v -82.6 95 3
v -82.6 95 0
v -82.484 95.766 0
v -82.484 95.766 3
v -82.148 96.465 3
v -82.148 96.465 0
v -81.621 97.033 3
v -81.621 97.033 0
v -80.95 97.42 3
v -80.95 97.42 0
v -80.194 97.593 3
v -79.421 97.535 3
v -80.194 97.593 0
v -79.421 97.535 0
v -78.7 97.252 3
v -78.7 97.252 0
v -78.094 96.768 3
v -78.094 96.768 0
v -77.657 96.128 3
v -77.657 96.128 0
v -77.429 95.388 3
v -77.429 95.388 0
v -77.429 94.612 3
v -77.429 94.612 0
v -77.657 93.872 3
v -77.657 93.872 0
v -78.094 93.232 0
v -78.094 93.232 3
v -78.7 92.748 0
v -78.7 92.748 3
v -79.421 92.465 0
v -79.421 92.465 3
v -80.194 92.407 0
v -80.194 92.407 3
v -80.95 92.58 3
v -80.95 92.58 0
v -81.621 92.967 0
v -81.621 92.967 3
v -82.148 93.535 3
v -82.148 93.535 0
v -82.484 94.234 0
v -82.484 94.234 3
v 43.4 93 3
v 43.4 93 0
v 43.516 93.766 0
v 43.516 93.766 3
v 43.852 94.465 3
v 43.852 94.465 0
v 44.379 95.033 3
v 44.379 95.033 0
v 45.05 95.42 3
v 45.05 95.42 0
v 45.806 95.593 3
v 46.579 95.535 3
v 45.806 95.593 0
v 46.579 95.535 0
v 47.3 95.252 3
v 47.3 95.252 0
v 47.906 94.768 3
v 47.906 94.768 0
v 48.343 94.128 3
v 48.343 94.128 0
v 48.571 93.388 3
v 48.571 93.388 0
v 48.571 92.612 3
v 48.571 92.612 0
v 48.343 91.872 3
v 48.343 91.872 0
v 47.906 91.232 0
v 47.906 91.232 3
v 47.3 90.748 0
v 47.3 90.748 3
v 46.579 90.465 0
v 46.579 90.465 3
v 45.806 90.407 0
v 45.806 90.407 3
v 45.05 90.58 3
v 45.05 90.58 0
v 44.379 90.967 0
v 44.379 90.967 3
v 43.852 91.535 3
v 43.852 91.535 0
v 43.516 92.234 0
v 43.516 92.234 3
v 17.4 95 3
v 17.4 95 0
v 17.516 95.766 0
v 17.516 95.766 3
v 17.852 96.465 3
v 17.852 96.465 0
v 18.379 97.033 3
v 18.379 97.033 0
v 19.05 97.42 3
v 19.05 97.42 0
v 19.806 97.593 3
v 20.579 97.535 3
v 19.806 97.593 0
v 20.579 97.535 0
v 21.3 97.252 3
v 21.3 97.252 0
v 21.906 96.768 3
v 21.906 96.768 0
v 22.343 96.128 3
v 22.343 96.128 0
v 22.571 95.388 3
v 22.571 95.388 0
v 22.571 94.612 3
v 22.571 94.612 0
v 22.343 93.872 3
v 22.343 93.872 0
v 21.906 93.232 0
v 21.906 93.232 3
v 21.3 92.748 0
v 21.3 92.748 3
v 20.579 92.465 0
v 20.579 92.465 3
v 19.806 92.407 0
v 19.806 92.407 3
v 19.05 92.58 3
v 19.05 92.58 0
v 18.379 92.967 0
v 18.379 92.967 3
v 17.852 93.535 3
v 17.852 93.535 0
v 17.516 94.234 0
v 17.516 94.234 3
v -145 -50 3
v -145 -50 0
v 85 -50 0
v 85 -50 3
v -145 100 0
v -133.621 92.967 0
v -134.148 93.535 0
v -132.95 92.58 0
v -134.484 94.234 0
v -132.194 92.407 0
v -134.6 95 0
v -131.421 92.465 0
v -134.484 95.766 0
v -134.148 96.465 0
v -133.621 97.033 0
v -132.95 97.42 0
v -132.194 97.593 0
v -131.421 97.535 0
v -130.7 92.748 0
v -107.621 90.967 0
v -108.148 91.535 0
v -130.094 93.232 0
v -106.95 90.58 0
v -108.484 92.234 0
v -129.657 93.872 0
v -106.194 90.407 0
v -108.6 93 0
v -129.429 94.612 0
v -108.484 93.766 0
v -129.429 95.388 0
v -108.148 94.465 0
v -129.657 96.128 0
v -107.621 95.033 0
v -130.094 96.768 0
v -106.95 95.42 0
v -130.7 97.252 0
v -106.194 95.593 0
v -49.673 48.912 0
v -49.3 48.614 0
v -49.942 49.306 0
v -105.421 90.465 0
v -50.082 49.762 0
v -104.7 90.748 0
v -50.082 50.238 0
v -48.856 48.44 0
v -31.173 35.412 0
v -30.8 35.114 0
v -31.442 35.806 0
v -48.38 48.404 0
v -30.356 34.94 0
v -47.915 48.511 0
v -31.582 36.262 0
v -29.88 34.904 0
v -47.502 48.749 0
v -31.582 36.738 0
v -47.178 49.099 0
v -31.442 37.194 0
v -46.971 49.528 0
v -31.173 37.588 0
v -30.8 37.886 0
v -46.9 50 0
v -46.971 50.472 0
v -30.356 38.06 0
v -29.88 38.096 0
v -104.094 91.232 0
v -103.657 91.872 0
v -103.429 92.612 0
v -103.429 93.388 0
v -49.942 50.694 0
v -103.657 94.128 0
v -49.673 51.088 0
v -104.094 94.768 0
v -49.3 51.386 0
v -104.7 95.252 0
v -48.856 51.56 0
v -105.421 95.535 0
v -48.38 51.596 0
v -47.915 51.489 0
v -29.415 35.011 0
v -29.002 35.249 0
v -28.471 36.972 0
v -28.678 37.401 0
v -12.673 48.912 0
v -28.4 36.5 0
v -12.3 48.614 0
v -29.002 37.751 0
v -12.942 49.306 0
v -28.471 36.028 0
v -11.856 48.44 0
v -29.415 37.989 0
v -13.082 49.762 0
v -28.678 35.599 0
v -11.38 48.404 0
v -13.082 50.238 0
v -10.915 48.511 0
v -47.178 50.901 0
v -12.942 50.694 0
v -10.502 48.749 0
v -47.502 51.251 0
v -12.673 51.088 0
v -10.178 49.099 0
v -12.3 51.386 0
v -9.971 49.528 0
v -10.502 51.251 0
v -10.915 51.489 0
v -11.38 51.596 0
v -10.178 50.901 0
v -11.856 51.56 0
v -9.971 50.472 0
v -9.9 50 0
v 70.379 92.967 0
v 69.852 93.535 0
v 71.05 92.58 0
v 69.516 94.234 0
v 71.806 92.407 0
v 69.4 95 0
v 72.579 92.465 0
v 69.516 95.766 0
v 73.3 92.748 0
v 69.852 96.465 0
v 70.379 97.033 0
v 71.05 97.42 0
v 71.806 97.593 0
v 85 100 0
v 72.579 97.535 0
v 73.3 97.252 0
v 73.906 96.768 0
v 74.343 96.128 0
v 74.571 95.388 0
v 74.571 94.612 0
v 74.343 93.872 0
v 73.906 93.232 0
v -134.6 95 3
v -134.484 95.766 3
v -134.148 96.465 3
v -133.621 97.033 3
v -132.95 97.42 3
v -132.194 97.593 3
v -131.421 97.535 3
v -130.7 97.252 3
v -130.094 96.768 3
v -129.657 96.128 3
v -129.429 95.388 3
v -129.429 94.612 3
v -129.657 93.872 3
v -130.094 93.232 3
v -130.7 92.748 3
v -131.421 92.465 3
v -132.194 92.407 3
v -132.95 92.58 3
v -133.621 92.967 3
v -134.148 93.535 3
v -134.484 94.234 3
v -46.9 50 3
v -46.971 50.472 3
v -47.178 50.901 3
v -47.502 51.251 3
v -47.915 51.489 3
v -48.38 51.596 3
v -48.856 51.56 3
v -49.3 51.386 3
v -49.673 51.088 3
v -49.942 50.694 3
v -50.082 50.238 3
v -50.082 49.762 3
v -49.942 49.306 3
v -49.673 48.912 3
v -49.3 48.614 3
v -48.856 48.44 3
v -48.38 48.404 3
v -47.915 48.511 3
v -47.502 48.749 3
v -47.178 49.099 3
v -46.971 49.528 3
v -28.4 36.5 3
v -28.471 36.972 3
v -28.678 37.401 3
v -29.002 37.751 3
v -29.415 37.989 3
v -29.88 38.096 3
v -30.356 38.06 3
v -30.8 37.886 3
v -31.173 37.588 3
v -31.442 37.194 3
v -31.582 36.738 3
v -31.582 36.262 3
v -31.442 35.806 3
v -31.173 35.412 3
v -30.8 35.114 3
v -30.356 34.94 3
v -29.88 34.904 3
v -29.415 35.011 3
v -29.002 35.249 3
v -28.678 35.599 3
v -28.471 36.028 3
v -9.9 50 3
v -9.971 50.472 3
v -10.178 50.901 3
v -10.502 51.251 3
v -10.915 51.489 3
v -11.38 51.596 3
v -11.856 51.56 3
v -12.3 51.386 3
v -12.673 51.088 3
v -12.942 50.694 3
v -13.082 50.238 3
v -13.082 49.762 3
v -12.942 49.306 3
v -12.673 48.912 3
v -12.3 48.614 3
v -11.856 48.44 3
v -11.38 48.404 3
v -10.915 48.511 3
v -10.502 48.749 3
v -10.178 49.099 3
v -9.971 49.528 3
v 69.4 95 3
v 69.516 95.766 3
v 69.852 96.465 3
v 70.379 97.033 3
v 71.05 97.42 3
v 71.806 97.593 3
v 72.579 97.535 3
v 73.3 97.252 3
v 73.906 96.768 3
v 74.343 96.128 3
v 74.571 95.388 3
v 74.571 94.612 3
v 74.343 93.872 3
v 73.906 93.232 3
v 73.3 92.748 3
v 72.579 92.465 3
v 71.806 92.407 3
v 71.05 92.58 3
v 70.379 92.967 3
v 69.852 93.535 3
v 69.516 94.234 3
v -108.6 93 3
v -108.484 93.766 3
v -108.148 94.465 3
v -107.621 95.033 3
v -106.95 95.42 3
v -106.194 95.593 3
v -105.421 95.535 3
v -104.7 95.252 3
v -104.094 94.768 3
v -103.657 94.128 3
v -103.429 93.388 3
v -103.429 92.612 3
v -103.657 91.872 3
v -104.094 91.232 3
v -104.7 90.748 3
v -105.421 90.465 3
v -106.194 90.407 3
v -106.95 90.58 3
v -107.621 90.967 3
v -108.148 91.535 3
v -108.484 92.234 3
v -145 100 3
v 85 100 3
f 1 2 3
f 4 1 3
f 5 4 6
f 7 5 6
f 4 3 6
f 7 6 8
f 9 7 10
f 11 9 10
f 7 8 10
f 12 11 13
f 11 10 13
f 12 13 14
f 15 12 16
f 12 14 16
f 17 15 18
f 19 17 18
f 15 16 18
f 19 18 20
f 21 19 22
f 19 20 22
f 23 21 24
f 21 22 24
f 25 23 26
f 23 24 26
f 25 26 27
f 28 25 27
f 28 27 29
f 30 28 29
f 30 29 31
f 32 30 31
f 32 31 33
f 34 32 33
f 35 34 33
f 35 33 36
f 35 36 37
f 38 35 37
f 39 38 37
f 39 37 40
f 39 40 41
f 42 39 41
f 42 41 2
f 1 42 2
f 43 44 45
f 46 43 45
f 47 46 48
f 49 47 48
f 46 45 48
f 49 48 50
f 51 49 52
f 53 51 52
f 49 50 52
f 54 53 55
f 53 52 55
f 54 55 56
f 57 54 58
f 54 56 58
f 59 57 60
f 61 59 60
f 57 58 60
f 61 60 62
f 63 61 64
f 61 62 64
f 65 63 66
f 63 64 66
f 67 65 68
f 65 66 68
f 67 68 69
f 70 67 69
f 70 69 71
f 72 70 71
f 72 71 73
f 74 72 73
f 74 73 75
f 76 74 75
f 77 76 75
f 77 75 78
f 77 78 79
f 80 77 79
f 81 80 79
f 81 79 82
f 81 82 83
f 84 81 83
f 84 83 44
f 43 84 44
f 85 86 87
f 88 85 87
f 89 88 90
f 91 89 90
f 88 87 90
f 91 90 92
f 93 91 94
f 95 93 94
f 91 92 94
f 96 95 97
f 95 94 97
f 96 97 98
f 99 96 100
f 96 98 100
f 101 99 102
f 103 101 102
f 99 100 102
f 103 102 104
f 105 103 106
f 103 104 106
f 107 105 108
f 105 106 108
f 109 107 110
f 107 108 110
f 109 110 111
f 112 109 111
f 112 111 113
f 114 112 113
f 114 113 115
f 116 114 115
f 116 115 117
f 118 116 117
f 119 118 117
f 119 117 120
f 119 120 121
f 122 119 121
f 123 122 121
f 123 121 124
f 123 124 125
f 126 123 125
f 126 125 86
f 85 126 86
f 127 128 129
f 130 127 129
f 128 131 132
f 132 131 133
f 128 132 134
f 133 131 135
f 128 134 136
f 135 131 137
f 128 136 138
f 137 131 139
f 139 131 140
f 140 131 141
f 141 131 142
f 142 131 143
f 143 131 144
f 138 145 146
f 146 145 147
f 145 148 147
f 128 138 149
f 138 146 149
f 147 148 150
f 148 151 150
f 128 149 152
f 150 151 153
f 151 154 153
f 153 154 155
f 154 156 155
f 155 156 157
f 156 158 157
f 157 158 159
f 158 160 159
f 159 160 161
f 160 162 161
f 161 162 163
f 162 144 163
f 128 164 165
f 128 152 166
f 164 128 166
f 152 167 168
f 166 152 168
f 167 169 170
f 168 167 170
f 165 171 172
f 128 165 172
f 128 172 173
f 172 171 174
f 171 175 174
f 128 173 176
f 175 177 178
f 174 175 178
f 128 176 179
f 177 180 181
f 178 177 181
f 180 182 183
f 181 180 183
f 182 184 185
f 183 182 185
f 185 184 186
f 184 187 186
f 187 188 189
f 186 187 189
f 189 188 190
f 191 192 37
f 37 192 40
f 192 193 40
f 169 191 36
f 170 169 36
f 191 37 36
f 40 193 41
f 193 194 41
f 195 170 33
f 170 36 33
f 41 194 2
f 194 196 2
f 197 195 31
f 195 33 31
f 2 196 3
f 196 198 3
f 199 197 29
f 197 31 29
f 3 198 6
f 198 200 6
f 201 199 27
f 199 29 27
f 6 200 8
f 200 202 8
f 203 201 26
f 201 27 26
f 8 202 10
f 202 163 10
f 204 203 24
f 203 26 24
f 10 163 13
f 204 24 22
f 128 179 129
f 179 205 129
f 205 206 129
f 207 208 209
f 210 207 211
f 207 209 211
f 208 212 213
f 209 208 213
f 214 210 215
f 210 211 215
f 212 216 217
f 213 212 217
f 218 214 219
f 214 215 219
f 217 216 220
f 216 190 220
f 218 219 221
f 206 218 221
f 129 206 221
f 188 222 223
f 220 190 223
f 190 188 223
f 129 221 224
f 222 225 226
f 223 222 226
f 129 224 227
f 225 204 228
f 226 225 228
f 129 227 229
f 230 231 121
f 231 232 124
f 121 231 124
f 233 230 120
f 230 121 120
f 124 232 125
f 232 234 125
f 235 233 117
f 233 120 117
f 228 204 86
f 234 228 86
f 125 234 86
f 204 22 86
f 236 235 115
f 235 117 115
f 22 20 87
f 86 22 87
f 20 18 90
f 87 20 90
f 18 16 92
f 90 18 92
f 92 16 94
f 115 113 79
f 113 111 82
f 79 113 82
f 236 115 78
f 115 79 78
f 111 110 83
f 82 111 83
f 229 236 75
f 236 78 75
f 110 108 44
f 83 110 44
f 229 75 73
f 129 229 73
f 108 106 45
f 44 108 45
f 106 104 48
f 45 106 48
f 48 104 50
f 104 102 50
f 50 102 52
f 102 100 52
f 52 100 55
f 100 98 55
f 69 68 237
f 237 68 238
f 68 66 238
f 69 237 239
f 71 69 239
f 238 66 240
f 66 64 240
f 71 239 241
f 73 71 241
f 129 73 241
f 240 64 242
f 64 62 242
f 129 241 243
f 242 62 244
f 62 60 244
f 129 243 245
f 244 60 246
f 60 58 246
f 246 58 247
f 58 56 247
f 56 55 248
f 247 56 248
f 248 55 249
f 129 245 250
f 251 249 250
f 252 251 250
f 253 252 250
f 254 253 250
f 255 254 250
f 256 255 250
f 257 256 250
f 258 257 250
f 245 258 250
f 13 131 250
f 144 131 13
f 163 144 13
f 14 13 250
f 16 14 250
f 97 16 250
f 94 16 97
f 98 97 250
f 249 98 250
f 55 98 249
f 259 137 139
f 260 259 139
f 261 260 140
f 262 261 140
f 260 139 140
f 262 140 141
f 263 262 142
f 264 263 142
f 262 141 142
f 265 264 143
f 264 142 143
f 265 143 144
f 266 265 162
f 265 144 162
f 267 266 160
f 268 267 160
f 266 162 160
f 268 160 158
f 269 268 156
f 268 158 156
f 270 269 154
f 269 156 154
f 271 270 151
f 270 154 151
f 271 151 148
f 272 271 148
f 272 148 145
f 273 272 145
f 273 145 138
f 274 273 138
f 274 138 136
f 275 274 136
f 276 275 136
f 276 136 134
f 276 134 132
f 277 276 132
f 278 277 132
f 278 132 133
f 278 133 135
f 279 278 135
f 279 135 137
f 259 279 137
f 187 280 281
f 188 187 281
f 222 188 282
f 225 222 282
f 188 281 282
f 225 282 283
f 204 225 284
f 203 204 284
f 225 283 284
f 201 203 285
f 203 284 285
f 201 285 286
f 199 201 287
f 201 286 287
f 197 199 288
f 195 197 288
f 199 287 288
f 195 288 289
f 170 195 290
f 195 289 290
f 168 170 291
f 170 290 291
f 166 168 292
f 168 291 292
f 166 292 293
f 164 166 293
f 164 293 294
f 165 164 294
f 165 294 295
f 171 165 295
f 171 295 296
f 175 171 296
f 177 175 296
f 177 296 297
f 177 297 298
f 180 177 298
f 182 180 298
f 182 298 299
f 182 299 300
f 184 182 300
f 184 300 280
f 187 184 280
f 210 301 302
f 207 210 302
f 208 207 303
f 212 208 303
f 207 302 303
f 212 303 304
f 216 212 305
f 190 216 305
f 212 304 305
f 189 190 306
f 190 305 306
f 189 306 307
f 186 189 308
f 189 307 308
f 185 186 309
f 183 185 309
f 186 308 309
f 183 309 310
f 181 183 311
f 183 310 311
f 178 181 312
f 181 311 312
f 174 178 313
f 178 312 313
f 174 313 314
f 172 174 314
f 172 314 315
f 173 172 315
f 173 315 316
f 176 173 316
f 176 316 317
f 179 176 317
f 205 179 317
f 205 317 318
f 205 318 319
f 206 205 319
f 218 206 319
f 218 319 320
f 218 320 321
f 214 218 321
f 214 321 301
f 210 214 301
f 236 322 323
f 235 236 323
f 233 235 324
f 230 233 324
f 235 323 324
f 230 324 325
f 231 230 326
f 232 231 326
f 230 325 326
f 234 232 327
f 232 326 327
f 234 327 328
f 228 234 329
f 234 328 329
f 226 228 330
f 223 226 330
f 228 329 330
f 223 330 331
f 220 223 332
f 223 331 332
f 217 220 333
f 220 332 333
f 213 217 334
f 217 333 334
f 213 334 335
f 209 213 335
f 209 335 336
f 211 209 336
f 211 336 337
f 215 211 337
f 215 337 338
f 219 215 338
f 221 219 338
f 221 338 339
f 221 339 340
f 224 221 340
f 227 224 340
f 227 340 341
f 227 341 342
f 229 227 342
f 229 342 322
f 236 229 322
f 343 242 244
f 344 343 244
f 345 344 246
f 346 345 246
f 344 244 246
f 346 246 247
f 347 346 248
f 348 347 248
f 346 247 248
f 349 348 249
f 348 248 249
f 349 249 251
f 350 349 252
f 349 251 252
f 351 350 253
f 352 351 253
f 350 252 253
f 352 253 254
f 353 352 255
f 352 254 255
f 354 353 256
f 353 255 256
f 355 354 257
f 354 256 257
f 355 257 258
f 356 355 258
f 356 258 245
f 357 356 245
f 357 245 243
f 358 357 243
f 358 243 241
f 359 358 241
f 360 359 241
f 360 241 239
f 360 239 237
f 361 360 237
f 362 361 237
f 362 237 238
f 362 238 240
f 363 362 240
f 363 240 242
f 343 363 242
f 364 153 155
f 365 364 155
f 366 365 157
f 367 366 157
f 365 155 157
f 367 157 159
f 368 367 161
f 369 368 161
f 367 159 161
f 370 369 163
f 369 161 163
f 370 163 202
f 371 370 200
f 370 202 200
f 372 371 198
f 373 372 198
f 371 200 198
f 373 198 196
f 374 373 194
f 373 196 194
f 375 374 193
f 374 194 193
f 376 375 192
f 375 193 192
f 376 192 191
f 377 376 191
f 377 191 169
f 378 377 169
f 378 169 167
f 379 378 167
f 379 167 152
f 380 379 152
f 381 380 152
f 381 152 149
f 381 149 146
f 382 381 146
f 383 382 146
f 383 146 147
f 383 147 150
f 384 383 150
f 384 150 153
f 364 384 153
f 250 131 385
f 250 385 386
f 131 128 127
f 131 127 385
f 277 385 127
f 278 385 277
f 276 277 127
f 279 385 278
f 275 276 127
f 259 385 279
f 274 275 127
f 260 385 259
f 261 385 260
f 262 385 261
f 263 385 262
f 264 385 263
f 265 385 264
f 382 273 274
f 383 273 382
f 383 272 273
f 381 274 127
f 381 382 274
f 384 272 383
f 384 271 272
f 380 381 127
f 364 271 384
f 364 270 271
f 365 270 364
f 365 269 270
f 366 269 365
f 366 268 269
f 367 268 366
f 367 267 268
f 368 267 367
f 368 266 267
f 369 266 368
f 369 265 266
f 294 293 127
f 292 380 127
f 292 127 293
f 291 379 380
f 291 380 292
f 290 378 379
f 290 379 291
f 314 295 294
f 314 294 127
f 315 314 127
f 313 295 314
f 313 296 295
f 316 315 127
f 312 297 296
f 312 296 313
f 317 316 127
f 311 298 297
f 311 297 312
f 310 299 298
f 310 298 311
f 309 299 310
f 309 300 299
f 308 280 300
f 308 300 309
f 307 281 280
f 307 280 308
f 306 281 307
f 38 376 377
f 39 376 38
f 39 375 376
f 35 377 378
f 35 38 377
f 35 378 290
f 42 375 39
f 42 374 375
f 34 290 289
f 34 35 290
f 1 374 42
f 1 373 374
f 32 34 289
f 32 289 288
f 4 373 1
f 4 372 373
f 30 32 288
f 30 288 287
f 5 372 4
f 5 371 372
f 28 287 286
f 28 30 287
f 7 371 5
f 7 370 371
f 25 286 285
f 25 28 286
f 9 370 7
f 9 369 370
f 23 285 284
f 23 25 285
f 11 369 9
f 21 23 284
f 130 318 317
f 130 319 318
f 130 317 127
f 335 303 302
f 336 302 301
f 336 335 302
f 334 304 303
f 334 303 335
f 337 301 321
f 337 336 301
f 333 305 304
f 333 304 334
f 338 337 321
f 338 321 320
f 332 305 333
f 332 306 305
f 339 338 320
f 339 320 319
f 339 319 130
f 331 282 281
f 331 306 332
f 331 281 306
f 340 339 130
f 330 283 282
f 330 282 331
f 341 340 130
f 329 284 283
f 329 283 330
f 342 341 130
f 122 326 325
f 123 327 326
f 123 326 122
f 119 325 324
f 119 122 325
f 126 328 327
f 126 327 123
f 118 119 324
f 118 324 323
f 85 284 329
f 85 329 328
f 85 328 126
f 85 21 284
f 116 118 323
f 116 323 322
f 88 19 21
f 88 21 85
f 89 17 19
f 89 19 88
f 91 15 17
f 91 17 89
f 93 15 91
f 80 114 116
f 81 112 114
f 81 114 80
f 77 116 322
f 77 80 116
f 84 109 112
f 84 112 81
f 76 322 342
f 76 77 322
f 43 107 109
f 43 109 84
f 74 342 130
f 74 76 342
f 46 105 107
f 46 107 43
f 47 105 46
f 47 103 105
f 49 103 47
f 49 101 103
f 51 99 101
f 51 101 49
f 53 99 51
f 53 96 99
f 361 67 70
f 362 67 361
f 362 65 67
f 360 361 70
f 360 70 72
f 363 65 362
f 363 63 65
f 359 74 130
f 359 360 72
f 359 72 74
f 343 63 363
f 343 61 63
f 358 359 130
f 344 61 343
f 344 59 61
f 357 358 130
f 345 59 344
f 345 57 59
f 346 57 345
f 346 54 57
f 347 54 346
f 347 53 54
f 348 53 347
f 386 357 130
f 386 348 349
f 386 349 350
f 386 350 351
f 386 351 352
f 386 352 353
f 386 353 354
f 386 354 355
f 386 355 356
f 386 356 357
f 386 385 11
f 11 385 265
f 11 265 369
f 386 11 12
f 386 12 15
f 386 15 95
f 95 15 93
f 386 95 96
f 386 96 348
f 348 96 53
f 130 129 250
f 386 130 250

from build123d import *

# Parameters (mm, degrees)
SKETCH_1_W          = 230
SKETCH_1_H          = 150
EXTRUDE_1_DEPTH     = 3
SKETCH_7_R          = 2.6
CUT_EXTRUDE_4_DEPTH = 10
SKETCH1_R           = 1.6
CUT_EXTRUDE1_DEPTH  = 10


with BuildPart() as part:
    # 草图1 → 凸台-拉伸1 (new body)
    with BuildSketch(Plane.XY):
        with Locations((-30, 25)):
            Rectangle(SKETCH_1_W, SKETCH_1_H)
    extrude(amount=EXTRUDE_1_DEPTH)

    # 草图7 → 切除-拉伸4 (cut)
    with BuildSketch(Plane(origin=(0, 0, 0), x_dir=(-1, 0, 0), z_dir=(0, 0, -1))):
        with Locations((-20, 95)):
            Circle(SKETCH_7_R)
        with Locations((-72, 95)):
            Circle(SKETCH_7_R)
        with Locations((-46, 93)):
            Circle(SKETCH_7_R)
        with Locations((132, 95)):
            Circle(SKETCH_7_R)
        with Locations((106, 93)):
            Circle(SKETCH_7_R)
        with Locations((80, 95)):
            Circle(SKETCH_7_R)
    extrude(amount=-CUT_EXTRUDE_4_DEPTH, mode=Mode.SUBTRACT)

    # Sketch1 → Cut-Extrude1 (cut)
    with BuildSketch(Plane.XY.offset(3)):
        with Locations((-30, 36.5)):
            Circle(SKETCH1_R)
        with Locations((-11.5, 50)):
            Circle(SKETCH1_R)
        with Locations((-48.5, 50)):
            Circle(SKETCH1_R)
    extrude(amount=-CUT_EXTRUDE1_DEPTH, mode=Mode.SUBTRACT)


solid = part.part
